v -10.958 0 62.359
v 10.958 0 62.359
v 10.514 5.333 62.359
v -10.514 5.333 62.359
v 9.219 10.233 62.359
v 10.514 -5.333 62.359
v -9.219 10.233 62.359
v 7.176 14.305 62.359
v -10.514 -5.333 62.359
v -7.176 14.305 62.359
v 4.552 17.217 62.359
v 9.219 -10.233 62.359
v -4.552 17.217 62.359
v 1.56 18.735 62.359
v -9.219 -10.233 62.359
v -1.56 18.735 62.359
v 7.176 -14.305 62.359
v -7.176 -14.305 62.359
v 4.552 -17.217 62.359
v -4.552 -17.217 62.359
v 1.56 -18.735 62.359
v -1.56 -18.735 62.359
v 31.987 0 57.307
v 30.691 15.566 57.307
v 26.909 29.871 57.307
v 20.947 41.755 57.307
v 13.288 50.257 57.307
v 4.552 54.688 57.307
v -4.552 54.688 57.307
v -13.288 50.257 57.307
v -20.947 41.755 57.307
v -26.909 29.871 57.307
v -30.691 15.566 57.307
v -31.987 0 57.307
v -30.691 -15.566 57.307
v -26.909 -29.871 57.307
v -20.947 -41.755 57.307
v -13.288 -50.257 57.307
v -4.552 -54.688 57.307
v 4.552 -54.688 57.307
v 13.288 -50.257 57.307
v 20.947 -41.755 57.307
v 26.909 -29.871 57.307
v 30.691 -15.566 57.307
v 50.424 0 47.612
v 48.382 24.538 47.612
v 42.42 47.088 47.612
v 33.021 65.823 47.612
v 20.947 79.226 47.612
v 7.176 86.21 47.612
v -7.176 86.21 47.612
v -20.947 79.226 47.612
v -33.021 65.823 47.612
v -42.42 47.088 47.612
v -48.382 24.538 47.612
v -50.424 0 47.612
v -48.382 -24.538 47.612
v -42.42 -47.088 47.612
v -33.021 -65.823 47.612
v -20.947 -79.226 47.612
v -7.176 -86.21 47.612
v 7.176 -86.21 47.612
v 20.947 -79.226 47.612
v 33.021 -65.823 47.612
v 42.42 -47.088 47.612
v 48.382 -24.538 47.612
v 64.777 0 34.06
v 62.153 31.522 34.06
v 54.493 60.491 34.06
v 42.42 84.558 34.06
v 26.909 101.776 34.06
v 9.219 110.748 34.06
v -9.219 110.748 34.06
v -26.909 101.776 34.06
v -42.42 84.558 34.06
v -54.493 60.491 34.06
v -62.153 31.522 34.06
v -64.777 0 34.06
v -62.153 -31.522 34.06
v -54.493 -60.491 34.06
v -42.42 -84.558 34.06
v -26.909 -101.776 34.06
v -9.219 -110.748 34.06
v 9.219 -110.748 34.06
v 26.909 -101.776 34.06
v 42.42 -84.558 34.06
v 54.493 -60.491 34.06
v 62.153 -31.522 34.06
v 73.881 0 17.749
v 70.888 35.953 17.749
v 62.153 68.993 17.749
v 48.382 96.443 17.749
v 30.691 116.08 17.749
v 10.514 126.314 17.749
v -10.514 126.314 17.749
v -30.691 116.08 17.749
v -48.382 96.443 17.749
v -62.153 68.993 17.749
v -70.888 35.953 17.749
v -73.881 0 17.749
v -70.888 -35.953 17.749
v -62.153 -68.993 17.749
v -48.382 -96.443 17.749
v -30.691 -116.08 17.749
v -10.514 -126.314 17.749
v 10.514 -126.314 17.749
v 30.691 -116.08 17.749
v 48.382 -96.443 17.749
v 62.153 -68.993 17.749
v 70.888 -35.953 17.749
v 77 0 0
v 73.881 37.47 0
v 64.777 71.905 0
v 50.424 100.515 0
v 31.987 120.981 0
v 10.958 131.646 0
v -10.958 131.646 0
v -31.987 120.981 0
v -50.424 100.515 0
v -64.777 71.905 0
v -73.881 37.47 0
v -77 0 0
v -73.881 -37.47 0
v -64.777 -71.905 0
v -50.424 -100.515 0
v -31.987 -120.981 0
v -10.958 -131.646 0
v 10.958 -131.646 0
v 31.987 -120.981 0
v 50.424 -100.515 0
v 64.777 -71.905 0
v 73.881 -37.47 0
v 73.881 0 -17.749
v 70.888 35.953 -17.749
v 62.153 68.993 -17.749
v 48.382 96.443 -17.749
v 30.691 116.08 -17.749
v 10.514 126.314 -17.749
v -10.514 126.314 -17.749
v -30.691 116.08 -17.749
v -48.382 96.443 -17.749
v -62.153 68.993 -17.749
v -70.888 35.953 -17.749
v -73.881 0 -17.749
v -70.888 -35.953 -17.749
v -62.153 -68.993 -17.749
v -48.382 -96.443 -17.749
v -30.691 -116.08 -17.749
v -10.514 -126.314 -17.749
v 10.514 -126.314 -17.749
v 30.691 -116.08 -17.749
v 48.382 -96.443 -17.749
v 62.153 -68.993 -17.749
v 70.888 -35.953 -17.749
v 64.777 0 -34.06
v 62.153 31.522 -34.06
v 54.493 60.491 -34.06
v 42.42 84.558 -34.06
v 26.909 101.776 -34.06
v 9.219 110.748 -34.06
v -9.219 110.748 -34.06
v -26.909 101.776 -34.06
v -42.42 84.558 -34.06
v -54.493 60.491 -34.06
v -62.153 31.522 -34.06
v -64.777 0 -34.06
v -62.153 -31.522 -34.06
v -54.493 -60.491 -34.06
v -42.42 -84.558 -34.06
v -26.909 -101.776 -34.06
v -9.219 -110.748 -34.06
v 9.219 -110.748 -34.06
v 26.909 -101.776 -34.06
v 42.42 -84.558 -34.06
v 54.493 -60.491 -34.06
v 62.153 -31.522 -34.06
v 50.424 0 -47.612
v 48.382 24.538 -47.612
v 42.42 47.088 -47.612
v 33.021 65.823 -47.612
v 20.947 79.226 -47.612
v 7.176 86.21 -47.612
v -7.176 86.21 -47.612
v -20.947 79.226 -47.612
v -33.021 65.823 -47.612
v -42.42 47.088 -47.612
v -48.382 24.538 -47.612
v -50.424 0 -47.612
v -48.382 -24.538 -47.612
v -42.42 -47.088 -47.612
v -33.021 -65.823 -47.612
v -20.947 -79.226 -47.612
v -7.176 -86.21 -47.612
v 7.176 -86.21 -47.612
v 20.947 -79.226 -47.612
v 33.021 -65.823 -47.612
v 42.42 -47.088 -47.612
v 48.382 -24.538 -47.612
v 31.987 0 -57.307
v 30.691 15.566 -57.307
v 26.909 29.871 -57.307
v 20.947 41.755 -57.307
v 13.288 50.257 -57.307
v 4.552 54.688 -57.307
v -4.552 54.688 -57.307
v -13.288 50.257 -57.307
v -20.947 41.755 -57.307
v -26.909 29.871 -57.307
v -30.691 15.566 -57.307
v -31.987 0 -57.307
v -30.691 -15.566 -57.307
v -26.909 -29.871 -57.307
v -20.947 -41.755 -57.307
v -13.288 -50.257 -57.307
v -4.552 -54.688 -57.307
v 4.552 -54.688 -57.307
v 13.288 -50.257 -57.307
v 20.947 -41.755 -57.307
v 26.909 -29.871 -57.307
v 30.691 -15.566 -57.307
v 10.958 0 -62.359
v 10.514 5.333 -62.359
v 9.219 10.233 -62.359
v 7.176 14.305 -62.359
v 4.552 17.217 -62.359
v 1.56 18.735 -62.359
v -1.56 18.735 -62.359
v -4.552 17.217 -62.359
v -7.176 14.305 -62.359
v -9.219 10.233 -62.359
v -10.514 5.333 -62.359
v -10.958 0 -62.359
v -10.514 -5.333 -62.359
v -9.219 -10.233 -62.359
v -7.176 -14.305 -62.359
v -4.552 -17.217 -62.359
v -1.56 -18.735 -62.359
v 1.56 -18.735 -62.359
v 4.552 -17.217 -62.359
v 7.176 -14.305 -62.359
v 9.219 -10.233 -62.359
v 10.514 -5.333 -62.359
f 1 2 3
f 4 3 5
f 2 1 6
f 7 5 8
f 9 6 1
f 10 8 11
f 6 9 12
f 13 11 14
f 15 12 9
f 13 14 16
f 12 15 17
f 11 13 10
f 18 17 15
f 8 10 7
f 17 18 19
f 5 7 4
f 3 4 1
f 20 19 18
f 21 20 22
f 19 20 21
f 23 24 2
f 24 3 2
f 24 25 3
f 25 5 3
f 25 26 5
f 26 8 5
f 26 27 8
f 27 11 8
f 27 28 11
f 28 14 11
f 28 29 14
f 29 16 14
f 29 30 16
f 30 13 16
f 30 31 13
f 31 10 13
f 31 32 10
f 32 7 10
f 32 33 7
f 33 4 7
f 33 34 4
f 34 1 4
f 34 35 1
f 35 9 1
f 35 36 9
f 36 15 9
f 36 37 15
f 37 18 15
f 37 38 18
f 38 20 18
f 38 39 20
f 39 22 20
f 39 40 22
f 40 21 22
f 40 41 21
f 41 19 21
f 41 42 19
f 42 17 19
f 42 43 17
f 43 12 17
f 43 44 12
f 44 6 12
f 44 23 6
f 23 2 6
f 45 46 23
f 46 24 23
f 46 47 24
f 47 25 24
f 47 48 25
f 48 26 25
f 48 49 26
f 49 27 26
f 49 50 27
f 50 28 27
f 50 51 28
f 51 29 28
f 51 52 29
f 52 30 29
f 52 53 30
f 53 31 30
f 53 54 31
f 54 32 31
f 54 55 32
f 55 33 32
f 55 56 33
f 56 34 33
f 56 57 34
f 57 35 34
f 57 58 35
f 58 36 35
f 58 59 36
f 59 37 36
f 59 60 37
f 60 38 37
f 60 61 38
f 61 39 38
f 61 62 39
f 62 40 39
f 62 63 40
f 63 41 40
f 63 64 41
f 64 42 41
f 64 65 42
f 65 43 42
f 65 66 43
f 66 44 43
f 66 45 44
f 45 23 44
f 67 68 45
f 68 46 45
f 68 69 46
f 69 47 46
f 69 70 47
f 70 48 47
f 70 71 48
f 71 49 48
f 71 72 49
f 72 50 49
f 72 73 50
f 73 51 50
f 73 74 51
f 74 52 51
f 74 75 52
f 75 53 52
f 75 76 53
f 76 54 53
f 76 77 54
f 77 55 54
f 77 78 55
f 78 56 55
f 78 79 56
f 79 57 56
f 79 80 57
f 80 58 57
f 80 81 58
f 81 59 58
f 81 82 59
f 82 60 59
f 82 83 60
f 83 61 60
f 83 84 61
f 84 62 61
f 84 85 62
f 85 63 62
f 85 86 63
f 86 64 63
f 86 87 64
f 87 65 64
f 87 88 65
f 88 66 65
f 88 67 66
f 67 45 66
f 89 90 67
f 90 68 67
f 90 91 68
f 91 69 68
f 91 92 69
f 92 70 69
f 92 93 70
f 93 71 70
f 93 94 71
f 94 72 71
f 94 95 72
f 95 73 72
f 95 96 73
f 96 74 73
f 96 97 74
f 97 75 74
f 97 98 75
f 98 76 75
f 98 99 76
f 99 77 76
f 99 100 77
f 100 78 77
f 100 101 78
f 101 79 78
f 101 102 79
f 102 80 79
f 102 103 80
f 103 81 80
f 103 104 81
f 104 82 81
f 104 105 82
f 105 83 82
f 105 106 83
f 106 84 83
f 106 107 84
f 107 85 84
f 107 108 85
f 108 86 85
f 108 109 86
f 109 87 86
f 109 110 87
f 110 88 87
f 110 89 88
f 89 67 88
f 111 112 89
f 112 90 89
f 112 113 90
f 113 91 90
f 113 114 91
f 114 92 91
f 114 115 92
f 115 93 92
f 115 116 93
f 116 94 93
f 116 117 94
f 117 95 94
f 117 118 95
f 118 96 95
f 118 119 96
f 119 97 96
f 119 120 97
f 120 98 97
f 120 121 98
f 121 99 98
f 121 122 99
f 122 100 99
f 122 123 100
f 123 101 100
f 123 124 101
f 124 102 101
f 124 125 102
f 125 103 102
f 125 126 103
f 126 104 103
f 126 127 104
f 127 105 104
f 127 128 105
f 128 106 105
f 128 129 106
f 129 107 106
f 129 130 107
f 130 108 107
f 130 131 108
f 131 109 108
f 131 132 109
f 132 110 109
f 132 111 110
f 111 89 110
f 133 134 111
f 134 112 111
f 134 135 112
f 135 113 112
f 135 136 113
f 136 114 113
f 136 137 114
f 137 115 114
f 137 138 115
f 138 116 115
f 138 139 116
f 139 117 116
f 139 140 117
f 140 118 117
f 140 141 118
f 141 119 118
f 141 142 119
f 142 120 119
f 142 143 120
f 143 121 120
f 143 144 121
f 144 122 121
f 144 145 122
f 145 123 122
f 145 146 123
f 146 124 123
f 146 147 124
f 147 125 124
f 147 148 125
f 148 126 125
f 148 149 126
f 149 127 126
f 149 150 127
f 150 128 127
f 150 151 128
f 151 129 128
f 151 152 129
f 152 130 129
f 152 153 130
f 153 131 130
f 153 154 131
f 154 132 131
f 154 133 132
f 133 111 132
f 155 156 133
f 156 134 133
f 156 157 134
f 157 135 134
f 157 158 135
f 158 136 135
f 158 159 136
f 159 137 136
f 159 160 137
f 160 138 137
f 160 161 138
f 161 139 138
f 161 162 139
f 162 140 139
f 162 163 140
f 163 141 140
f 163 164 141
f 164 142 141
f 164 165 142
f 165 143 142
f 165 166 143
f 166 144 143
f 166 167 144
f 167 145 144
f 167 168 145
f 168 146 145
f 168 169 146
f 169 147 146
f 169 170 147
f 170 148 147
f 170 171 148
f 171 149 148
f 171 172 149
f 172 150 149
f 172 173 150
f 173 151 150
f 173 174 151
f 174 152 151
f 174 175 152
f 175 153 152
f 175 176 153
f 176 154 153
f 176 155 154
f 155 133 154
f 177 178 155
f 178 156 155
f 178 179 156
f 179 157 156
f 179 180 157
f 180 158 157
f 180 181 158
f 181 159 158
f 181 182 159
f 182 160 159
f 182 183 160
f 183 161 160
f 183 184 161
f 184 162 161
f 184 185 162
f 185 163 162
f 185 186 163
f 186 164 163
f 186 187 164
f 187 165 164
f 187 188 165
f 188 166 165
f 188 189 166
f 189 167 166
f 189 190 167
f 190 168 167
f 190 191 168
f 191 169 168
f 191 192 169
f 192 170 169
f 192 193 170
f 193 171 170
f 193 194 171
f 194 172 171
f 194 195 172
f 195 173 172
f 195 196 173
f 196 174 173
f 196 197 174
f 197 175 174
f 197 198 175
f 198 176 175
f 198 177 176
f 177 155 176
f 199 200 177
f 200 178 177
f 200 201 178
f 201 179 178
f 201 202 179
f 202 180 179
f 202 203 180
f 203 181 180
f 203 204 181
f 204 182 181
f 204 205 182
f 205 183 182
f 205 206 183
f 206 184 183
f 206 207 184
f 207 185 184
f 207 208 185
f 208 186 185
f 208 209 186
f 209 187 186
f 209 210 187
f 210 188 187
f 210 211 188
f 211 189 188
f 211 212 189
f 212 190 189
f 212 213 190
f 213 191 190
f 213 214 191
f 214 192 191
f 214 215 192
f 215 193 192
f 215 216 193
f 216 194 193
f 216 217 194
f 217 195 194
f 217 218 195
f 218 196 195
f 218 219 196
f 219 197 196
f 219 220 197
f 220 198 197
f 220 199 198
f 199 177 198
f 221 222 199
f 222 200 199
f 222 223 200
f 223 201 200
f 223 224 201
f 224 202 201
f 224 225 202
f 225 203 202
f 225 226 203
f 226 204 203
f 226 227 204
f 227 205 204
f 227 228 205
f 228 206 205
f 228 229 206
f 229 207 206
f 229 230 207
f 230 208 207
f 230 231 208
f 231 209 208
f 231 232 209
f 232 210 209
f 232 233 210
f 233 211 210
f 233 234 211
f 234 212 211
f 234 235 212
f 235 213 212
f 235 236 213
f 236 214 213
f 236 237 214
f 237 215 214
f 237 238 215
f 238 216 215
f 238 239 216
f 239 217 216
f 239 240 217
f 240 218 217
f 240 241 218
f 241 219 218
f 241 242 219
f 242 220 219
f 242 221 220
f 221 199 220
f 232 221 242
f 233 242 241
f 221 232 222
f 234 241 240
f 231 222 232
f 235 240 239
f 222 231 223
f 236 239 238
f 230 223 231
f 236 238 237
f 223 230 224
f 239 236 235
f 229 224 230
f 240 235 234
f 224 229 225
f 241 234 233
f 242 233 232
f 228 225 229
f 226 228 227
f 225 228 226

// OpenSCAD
// Generated by SolidPython 1.0.1 on 2020-07-29 00:46:50


scale(v = [11, 19, 9]) {
	sphere(r = 7);
}
/***********************************************
*********      SolidPython code:      **********
************************************************
 
# import packages: SolidPython
from solid import *
from solid.utils import *
from itertools import chain, combinations, permutations


class Resize:

    def __init__(self, scad_file):
        self.scad_file = scad_file
        #self.scad_file = import_scad(scad_file)
        # cone/cylinder param:
        self.r1 = 0
        self.r2 = 0
        self.h = 0
        # rectangular prism param:
        self.w = 0
        self.l = 0
        # ellipse param:
        self.r = 0

    # import OpenScad code (file name corresponds to shape)


    # classify shape + parameters
    def assign(self, param1, param2, param3):
        if self.scad_file == 'cone.scad':
            self.r1 = param1
            self.r2 = param2
            self.h = param3
        elif self.scad_file == 'cylinder.scad':
            self.r1 = param1
            self.r2 = param2
            self.h = param3
        elif self.scad_file == 'rectangularPrism.scad':
            self.h = param1
            self.l = param2
            self.w = param3
        else:
            self.r = param1
            self.h = param2

    # resize parameters
    def iterate(self):
        x = range(3, 20, 2)
        i = 1
        if self.scad_file == 'cone.scad':
            tempList = list(permutations(x, 2))
            for temp in tempList:
                param1 = temp[0]
                param2 = temp[1]
                filepath = 'produced_scad_files/' + 'cone' + str(param1) + '_' + str(param2) + '_' + '.scad'
                scad_render_to_file(cylinder(h=param1, r1=param2, r2=0), filepath)

        elif self.scad_file == 'cylinder.scad':
            tempList = list(permutations(x, 3))
            for temp in tempList:
                param1 = temp[0]
                param2 = temp[1]
                filepath = 'produced_scad_files/' + 'cylinder' + str(param1) + '_' + str(param2) + '_' + '.scad'
                scad_render_to_file(cylinder(h=param1, r1=param2, r2=param2), filepath)

        elif self.scad_file == 'rectangularPrism.scad':
            tempList = list(permutations(x, 3))
            for temp in tempList:
                param1 = temp[0]
                param2 = temp[1]
                param3 = temp[2]
                filepath = 'produced_scad_files/' + 'rectangularPrism' + str(param1) + '_' + str(param2) + '_' + str(
                    param3) + '.scad'
                scad_render_to_file(cube(size=(param1, param2, param3)), filepath)

        elif self.scad_file == 'ellipse.scad':
            tempList = list(permutations(x, 4))
            for temp in tempList:
                param1 = temp[0]
                param2 = temp[1]
                param3 = temp[2]
                param4 = temp[3]
                filepath = 'produced_scad_files/' + 'ellipse' + str(param1) + '_' + str(param2) + '_' + str(param3) + '_' + str(param4) + '.scad'
                scad_render_to_file(scale([param1, param2, param3])(sphere(r=param4)), filepath)

    def render_to_scadfile(self):
        scad_render_to_file(scad, 'example.scad') 
 
************************************************/
